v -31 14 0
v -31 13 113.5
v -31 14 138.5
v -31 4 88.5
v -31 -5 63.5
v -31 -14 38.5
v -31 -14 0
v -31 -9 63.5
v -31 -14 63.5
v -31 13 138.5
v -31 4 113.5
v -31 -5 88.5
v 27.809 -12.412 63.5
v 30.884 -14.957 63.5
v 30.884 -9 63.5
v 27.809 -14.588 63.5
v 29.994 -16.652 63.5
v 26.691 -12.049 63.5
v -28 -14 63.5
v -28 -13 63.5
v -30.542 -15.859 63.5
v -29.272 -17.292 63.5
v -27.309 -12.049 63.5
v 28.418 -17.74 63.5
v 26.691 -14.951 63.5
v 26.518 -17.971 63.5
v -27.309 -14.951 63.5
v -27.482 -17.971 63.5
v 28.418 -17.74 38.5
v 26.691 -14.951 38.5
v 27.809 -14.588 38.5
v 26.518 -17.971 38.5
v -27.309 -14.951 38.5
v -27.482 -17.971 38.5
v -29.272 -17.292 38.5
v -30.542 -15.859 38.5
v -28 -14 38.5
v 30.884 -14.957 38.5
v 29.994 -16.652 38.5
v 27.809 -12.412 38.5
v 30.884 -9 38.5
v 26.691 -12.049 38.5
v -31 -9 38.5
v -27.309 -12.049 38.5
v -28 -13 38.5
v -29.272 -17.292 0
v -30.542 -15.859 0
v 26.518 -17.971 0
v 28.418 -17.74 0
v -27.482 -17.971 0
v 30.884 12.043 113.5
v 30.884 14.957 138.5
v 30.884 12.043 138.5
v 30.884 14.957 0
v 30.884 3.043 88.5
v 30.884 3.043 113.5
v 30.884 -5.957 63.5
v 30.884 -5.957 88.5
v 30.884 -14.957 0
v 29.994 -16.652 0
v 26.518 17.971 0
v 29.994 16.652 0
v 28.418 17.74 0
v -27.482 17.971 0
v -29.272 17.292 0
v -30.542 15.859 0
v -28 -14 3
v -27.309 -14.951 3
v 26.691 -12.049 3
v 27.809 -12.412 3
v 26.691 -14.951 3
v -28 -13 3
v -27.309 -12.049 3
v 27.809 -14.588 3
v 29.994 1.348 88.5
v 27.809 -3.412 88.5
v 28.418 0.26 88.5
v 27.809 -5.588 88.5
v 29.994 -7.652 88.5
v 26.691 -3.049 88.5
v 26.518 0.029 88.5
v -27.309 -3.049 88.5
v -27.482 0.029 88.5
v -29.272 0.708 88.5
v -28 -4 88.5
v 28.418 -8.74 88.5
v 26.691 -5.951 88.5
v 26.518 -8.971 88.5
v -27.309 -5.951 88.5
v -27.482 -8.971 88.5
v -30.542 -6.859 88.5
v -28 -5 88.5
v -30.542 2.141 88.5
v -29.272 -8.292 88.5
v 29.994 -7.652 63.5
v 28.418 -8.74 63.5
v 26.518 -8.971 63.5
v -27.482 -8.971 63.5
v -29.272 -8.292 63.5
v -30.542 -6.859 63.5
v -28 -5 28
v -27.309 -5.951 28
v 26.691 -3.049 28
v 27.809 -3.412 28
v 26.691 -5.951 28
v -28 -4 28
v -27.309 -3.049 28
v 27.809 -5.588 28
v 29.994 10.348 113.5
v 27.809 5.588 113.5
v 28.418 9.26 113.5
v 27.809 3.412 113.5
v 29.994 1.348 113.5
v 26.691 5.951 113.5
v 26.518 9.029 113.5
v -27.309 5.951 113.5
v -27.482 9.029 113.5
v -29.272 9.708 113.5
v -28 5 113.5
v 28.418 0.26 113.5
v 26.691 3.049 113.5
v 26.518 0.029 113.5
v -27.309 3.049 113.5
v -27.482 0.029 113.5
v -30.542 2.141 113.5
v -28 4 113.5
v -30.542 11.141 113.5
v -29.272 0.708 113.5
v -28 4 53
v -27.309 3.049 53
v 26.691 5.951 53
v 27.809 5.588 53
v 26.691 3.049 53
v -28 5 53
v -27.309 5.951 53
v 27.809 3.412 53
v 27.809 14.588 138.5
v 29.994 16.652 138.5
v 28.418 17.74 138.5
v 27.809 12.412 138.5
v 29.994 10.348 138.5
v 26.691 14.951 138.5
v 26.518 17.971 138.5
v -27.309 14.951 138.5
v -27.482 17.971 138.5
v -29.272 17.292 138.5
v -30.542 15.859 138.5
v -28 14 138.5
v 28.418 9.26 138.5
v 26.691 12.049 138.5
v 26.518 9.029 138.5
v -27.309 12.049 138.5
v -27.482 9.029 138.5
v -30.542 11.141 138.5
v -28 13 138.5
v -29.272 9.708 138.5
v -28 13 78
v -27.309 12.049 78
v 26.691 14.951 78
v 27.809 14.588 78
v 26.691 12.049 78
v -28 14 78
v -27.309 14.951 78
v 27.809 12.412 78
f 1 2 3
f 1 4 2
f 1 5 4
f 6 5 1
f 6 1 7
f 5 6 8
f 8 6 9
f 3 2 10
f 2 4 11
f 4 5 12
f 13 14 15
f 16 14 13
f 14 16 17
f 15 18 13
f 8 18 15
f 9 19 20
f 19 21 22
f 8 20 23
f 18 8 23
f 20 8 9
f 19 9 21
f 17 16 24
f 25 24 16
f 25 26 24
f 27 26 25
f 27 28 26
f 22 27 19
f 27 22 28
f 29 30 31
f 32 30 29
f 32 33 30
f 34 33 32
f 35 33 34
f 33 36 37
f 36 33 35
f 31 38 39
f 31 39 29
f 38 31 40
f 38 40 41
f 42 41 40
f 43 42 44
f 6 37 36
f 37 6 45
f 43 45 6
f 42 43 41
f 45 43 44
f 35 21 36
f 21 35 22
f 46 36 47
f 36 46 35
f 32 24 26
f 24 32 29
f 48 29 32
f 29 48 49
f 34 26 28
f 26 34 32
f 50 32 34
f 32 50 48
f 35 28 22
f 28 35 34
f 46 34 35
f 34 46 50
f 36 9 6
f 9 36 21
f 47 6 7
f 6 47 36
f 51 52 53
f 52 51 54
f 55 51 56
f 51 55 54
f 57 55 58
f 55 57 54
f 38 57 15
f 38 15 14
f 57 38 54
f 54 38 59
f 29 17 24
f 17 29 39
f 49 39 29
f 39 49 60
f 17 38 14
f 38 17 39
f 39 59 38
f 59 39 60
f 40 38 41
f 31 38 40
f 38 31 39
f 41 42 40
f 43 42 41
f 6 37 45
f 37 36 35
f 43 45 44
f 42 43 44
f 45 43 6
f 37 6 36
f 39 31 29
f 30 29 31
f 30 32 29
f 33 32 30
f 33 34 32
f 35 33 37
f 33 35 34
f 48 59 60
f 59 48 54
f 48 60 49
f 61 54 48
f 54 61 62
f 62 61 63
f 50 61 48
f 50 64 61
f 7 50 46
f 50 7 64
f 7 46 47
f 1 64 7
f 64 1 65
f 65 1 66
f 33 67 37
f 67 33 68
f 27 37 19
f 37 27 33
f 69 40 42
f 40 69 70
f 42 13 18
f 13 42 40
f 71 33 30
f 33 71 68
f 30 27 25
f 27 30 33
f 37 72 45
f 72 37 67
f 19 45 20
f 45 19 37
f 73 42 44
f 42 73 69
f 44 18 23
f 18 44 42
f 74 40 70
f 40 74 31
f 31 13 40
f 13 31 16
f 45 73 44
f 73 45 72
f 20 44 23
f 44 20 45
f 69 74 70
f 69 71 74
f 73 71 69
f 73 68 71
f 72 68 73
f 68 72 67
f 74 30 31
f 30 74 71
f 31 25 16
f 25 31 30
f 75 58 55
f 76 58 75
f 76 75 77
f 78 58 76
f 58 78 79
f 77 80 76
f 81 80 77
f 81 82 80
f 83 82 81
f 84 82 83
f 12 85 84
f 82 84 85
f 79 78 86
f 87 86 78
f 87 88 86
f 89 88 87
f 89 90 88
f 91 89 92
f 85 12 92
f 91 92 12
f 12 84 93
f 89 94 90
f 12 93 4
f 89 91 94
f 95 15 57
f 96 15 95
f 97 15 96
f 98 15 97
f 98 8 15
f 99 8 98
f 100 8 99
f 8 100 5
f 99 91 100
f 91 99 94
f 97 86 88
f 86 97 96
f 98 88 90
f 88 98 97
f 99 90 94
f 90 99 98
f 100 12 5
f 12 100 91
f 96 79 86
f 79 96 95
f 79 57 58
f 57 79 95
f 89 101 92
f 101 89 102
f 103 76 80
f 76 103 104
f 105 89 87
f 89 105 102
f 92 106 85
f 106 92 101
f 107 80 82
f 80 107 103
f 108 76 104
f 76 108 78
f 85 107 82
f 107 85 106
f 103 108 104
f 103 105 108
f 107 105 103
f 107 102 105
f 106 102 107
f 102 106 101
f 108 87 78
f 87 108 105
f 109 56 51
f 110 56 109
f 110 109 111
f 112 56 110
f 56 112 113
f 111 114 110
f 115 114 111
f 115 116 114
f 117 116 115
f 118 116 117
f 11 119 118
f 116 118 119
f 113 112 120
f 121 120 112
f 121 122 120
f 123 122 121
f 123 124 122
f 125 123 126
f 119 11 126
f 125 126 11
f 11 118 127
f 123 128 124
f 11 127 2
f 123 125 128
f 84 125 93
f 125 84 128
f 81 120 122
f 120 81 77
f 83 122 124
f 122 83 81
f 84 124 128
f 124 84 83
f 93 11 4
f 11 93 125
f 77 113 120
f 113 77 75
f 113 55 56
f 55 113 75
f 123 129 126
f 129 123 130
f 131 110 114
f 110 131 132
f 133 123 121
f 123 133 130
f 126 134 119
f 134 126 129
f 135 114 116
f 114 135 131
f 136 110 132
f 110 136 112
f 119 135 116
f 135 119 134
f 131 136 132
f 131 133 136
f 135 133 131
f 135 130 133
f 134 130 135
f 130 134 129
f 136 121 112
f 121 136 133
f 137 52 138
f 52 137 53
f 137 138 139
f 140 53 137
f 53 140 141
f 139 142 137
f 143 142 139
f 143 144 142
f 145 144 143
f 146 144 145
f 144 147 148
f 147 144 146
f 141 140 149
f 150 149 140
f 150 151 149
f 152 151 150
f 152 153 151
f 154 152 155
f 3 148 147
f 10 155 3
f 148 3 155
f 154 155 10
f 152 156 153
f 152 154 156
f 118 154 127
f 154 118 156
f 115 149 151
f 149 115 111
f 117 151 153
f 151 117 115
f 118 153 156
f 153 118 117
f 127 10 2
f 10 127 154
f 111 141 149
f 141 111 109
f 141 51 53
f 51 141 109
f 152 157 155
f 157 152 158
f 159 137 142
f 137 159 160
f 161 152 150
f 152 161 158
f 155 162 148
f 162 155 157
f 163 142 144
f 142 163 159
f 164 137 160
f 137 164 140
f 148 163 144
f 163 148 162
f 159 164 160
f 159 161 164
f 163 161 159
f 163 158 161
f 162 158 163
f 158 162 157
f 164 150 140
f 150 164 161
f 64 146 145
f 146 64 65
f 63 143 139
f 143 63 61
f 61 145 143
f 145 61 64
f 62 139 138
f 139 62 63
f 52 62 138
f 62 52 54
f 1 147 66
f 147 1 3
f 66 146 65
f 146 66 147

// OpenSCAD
// file: cardholder.scad
/* cardholder.scad 
 *
 * Vypracovani ukolu z predmetu BI-3DT
 * Vojtech Myslivec, FIT CVUT v Praze, 2015
 *
 */


// ramecek, se zaoblenym vrskem
module blok( 
             velikost   = [ 30, 10, 35 ],
             zaobleni   = 1,
             delta      = 10
           ) {
    //hranaty spodek
    cube( velikost - delta*[0,0,1] );
    // zaobleny vrsek
    translate( [0,0,velikost[2]-delta] ) {
        intersection() {
            cube( [velikost[0],velikost[1],delta] );

            // maska -- zaoblene rohy
            pozice      = [ 0, velikost[1], 0 ] + zaobleni*[1,-1,0];
            rozestup_X  = velikost[0] - 2*zaobleni;
            rozestup_Y  = velikost[1];

            translate( pozice ) 
                hull() {
                    for ( i=[0,1], j=[0,1] )
                        translate ( [ i*rozestup_X, -j*rozestup_Y, 0 ] )
                            cylinder( r=zaobleni, h=delta );
                }
        }
    }
}

// dira na kartu
module dira(
            velikost    = [ 20, 5, 25 ],
            spacing     = 1
           ) {
    // vnitrni dira je zaoblena, ale spodni strana je rovna
    if ( spacing == 0 ) {
        cube( velikost );
    }
    else {
        hull() {
            for ( i=[0,1], j=[0,1] )
                translate([ i*velikost[0], j*velikost[1], 0 ])
                    cylinder( r=spacing, h=velikost[2] );
        }
    }
}

// prihradka na jednu kartu s podstavcem
module prihradka(
                    celkova_velikost    = [ 25, 5, 30 ],
                    vnitrni_velikost    = [ 21, 1, 29 ],
                    spacing     = 1,
                    thickness   = 1,
                    delta       = 10,
                    uroven      = 0
                ) {
    if ( celkova_velikost[2] > 0 || uroven != 0 ) { 
        // posun diry oproti bloku
        stred_X = ( celkova_velikost[0] - vnitrni_velikost[0] )/2;
        stred_Y = ( celkova_velikost[1] - vnitrni_velikost[1] )/2;
        posun = [ stred_X, stred_Y, thickness ];
        // celkova velikost podstavce
        podstavec = delta*uroven;

        // posunuti prihradky na danou uroven
        // rozdil 2 -- duta prihradka
        difference() {
            blok( 
                    velikost    = celkova_velikost + [0,0,podstavec],
                    zaobleni    = spacing + thickness,
                    delta       = delta
                );

            // dira
            translate( [ 0, 0, podstavec ]) {
                translate( posun ) {
                    dira(
                            //  vyska je plus 1, aby byla dira videt v nahledu
                            velikost    = vnitrni_velikost + [0,0,1],
                            spacing     = spacing
                        );
                }

            }
        }
    }
}

module drzak (
                    celkova_velikost    = [ 25, 5, 30 ],
                    vnitrni_velikost    = [ 21, 1, 29 ],
                    thickness           = 3,
                    spacing             = 1,
                    cards               = 4,
                    delta               = 25,
    ) {
    // celkove vnejsi zaobleni
    zaobleni    = spacing + thickness;

    // rozmery masky -- vyska a rozestupy valcu
    maska_vyska      =       celkova_velikost[2] + (cards-1)*delta;
    maska_rozestup_X =       celkova_velikost[0] - 2*zaobleni;
    maska_rozestup_Y = cards*celkova_velikost[1] - 2*zaobleni;
    maska_pozice     = zaobleni*[1,1,0] - [ 0, (cards-1)*celkova_velikost[1], 0 ]; 

    intersection() { 
        // pro kazdou kartu vygeneruje prihradku vlastnim modulem
        for ( i = [0:cards-1] ) {
            translate([ 0, 0-i*celkova_velikost[1], 0 ]) {
                prihradka( 
                        celkova_velikost = celkova_velikost,
                        vnitrni_velikost = vnitrni_velikost,
                        spacing          = spacing,
                        thickness        = thickness,
                        delta            = delta,
                        uroven           = i
                        );
            }
        }

        // maska -- zaoblene rohy
        translate ( maska_pozice ) {
            hull() {
                for ( i=[0,1], j=[0,1] )
                    translate([ i*maska_rozestup_X, j*maska_rozestup_Y, 0 ])
                        cylinder( r=zaobleni, h=maska_vyska );
            }
        }
    }
}

module karta( size = [ 20, 10, 5 ] ) {
    color( "green" ) 
            cube( [ size[1], size[2], size[0] ] );
}

module cardholder(
                    size        = [ 85, 54, 1 ],
                    thickness   = 3,
                    spacing     = 1,
                    cards       = 4,
                    delta       = 25,
                    visibility  = 0.3
        ) { 

    // TODO kontrola, ze size je vektor alespon 2 hodnot. 
    if ( size[0] > 0 && size[1] > 0 && size[2] >= 0 && cards > 0 ) {

        // oprava otoceni dle zadani
        rotate([0,0,180])
            // hnusny if, kvuli zadani
            if ( delta < 0 ) {
                // diky oprave otoceni se objekt otoci, kdyz je znovu zavolan
                //rotate([0,0,180])
                cardholder( size, thickness, spacing, cards, -delta, visibility );
            }
            else {
                spacing     =   spacing > 0 ?   spacing: 0;
                thickness   = thickness > 0 ? thickness: 0;
                // celkove vnejsi zaobleni
                zaobleni    = spacing + thickness;
                // uprava zadani
                //delta       = delta + spacing;

                viditelnost_max =      ( visibility > 1 ) ? 1 :      visibility;
                viditelnost     = ( viditelnost_max < 0 ) ? 0 : viditelnost_max;
                // rozmery jedne prihradky
                vnitrni_velikost    = [ size[1], size[2], (1-viditelnost) * size[0] + spacing ];
                celkova_velikost    = vnitrni_velikost + 2*zaobleni*[1,1,0] + [0,0,thickness];

                // oprava pozice dle zadani
                oprava_pozice = -1/2*[ celkova_velikost[0], (2-cards)*celkova_velikost[1], 0 ];
                translate( oprava_pozice ) {
                    // demo karta
                    %translate( zaobleni*[1,1,1] )
                        karta( size=size );

                    drzak(
                            celkova_velikost    = celkova_velikost,
                            vnitrni_velikost    = vnitrni_velikost,
                            thickness           = thickness,
                            spacing             = spacing,
                            cards               = cards,
                            delta               = delta
                         );
                }
            }
    }
}

//translate([0,100,0]) cardholder( );
cardholder( 
            size        = [30,20,10],//[80,40,5],
            spacing     = 2,
            cards       = 5,
            thickness   = 5,
            visibility  = 0.5,
            delta       = 15
          );

//prihradka( celkova_velikost=[451,100,700], vnitrni_velikost=[350,10,600], spacing=30, delta=100, uroven=1  );
// main file
// 
// // dira na kartu
// module dira(
//             velikost    = [ 20, 5, 25 ],
//             spacing     = 1
//            ) {
//     // vnitrni dira je zaoblena, ale spodni strana je rovna
//     hull() {
//         for ( i=[0,1], j=[0,1] )
//             translate([ i*velikost[0], j*velikost[1], 0 ])
//                 cylinder( r=spacing, h=velikost[2] );
//     }
// }
// 
// module dira1(
//             velikost    = [ 20, 5, 25 ],
//             spacing     = 1
//            ) {
//     // vnitrni dira je zaoblena, ale spodni strana je rovna
//     intersection() {
//         // zaobleni
//         minkowski() {
//             cube( velikost + [0,0,spacing] );
//             sphere( spacing );
//         }
//         // prunik s rovnou krychli
//         translate( -spacing*[1,1,0] ) {
//             cube( velikost + 2*spacing*[1,1,1] );
//         }
//     }
// }


//v=[25,10,20];
//s=10;
//#dira1(v,s);
//dira(v,s);

//a=10;
//intersection() {
//    cube(a);
//    translate([a,0,0])
//        cube(a);
//}

use <./cardholder.scad>;

cardholder();
